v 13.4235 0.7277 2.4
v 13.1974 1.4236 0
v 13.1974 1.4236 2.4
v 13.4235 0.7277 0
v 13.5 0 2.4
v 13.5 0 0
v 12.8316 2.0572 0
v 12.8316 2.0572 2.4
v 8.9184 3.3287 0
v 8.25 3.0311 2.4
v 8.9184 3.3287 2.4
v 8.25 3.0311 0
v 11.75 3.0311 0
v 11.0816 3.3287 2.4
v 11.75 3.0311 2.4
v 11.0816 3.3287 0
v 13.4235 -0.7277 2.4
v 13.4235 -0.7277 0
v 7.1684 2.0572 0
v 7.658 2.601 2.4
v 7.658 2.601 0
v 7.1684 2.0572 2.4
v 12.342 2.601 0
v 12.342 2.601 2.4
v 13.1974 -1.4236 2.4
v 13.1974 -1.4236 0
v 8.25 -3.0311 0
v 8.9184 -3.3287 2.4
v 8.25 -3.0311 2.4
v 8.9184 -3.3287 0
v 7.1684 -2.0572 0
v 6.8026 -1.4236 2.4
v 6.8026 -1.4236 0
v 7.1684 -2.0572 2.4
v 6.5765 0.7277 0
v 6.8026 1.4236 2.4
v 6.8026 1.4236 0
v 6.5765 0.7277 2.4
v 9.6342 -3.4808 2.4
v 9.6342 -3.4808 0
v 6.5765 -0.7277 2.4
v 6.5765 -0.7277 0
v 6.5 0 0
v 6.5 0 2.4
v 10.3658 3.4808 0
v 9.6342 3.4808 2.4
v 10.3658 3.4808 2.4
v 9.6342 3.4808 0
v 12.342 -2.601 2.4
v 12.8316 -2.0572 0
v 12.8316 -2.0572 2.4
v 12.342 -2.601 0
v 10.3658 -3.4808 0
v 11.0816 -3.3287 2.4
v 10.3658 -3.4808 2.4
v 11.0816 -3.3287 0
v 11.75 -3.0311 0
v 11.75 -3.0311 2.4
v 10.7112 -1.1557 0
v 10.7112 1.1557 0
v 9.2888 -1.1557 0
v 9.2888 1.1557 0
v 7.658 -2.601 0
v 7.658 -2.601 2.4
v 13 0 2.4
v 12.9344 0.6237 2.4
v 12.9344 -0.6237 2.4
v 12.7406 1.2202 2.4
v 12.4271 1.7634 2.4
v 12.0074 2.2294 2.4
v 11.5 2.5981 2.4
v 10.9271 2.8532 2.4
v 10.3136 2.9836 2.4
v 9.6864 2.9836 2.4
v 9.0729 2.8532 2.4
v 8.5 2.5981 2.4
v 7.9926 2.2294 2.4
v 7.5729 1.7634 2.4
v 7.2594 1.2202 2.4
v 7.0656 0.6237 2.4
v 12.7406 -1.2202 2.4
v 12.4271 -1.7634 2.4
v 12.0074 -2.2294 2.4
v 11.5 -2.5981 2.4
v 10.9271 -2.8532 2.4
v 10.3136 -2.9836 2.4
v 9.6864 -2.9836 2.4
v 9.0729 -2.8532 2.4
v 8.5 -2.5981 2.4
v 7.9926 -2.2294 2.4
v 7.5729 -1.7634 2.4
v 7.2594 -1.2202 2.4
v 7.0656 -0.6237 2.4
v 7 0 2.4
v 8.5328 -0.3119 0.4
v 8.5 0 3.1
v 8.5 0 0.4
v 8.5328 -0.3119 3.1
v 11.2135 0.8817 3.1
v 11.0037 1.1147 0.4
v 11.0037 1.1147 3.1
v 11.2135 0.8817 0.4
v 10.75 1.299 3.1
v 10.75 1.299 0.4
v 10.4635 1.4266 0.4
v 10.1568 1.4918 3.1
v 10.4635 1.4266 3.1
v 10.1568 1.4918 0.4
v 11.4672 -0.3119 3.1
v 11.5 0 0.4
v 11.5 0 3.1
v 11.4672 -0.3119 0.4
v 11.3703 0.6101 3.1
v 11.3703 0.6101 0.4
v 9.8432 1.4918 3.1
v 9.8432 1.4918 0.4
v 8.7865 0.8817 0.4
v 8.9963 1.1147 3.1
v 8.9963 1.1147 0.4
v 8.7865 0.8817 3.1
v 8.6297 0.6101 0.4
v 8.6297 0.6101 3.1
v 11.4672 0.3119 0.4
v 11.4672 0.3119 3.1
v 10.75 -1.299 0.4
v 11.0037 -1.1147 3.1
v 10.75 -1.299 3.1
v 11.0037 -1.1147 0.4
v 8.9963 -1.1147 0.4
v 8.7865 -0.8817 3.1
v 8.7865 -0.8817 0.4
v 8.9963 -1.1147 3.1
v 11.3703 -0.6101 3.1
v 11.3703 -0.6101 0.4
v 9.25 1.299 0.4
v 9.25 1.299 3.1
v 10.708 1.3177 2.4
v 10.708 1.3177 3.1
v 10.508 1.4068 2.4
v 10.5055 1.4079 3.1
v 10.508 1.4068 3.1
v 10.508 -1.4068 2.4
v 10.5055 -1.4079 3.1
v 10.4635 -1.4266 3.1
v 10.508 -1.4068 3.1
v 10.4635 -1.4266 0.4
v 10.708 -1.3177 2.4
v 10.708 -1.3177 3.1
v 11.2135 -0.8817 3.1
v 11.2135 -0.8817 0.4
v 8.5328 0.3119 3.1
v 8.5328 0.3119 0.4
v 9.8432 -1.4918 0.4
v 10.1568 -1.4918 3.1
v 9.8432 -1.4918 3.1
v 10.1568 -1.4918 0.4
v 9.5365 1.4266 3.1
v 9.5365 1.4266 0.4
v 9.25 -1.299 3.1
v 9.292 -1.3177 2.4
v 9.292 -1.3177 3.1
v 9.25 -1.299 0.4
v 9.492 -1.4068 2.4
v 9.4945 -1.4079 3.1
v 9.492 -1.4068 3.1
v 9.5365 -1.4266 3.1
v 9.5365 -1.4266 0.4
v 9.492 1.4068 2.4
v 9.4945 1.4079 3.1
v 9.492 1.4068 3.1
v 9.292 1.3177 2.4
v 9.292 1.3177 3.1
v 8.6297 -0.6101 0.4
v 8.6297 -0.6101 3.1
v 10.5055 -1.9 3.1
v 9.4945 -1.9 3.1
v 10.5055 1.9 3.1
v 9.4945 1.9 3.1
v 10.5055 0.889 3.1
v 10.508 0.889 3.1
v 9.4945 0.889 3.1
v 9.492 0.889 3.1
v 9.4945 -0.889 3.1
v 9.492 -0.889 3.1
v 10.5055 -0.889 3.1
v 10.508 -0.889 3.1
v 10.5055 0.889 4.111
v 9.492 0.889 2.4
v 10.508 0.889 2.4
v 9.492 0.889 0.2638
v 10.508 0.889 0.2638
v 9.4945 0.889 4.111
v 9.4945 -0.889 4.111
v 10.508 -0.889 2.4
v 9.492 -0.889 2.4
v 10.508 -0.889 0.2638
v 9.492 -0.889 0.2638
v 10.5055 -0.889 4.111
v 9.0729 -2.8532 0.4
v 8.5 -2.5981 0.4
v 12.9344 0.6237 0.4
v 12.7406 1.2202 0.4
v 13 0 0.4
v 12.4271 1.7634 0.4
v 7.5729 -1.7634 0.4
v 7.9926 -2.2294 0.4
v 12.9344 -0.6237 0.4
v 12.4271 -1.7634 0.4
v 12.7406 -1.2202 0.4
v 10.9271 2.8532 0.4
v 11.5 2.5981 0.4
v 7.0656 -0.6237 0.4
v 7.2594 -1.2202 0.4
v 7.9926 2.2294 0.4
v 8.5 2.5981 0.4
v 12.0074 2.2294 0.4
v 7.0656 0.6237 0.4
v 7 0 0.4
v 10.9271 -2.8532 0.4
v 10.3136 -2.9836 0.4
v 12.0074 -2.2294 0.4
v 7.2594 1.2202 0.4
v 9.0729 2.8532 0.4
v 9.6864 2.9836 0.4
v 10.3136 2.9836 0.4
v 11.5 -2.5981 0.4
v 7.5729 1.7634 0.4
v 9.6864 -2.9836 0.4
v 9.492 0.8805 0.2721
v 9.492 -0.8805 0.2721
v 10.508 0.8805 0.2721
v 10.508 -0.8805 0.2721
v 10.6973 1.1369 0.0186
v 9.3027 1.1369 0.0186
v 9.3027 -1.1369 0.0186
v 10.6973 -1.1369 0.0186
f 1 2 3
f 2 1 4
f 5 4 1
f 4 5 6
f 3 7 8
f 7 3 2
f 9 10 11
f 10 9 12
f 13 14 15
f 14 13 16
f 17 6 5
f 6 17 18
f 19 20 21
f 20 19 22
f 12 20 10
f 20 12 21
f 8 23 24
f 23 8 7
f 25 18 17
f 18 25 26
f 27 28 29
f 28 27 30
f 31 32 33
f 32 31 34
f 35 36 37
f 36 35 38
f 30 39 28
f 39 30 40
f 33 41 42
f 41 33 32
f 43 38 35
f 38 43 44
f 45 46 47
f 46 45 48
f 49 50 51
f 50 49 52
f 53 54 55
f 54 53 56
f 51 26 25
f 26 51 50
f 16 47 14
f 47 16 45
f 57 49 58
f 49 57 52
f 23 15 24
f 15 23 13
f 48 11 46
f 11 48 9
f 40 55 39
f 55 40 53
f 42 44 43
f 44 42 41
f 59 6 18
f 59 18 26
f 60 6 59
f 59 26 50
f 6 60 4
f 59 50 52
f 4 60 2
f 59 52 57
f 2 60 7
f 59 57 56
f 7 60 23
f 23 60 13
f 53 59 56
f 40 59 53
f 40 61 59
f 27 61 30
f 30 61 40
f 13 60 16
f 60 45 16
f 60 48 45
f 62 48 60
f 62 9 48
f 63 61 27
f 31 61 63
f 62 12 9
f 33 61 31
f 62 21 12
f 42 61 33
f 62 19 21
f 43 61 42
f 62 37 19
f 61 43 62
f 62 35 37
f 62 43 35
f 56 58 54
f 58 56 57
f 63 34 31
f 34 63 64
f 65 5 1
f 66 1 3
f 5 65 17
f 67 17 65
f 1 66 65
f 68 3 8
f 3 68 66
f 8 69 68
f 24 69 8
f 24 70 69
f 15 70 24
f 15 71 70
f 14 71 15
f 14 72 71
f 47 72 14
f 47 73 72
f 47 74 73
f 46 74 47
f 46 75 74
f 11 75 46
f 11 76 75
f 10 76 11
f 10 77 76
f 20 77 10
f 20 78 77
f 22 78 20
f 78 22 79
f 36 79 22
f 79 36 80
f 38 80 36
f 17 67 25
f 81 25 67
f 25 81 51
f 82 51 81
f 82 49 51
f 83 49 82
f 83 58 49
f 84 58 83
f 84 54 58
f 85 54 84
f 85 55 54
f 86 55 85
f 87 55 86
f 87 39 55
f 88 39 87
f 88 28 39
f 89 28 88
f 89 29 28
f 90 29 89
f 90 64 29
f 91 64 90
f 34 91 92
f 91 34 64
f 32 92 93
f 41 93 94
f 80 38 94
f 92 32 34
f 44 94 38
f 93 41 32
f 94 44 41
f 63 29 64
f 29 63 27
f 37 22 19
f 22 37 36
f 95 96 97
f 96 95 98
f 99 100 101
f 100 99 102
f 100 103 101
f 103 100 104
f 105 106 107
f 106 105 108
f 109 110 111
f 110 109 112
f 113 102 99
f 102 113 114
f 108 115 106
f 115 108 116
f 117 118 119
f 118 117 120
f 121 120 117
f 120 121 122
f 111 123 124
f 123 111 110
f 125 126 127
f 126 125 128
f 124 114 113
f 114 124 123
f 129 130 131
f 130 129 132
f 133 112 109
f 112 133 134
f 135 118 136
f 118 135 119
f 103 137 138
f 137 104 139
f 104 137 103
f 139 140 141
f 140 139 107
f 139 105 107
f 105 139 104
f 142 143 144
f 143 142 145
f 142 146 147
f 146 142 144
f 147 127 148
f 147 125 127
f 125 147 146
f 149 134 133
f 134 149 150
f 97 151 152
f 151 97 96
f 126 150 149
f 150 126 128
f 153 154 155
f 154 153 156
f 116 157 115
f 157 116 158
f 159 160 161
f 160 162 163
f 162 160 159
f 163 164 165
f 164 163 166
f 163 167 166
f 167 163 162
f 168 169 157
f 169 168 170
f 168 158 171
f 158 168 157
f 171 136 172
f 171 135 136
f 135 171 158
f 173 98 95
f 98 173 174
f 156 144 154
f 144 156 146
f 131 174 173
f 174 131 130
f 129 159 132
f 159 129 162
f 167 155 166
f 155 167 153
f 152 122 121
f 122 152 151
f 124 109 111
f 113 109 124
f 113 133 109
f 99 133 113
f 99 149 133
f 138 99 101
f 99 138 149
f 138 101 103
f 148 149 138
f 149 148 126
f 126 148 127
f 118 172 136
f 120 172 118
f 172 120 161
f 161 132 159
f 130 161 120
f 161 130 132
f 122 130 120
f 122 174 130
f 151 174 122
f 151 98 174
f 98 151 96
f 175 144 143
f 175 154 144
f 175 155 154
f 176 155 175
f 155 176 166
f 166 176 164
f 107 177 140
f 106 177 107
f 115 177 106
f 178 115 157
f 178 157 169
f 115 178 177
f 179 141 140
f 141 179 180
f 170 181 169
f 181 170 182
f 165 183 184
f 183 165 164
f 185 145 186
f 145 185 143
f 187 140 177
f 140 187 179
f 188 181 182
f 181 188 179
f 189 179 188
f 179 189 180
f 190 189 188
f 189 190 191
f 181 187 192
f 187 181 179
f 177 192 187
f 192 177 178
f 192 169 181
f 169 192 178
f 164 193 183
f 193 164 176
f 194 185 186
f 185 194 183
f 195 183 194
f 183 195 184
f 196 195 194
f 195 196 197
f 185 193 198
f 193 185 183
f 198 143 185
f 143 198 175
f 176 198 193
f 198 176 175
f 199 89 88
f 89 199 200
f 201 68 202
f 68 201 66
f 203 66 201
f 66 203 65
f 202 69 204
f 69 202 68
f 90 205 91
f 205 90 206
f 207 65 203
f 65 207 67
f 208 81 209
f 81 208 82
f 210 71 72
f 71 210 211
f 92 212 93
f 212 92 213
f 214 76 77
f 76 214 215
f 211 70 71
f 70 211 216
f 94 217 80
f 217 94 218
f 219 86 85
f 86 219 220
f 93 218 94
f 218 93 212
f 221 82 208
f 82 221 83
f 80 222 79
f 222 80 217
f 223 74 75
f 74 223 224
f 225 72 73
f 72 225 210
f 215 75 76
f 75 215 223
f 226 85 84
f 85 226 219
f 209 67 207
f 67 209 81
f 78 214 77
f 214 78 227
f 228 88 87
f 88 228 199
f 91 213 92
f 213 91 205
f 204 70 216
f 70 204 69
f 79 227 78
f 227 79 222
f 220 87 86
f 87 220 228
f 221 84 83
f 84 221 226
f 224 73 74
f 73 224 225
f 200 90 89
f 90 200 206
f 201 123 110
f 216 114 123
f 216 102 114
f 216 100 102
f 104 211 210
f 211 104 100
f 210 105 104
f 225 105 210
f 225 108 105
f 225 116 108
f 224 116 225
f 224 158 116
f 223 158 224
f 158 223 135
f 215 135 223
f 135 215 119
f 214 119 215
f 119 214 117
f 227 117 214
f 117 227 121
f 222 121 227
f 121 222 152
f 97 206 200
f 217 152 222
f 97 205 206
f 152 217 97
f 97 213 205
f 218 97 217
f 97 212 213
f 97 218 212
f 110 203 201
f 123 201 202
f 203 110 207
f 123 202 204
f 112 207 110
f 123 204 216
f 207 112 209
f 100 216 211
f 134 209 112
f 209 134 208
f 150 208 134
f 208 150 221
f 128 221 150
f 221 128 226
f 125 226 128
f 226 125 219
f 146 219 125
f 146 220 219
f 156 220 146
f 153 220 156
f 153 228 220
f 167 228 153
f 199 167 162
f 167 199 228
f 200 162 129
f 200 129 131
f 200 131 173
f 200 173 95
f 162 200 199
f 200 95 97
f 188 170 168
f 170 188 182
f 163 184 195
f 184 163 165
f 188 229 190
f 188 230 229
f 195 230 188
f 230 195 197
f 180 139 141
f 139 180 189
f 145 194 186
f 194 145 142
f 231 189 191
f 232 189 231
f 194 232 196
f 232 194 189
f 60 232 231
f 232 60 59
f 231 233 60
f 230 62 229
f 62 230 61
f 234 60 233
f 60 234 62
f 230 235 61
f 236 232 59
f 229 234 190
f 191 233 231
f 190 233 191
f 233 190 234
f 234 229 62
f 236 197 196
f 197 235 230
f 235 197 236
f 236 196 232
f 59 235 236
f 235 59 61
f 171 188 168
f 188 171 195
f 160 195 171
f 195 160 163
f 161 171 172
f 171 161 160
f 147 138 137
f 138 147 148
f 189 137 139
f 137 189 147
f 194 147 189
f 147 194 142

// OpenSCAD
// Higher definition curves
$fs = 0.01;

module roundedcube(size = [1, 1, 1], center = false, radius = 1.0, apply_to = "all") {
	// If single value, convert to [x, y, z] vector
	size = (size[0] == undef) ? [size, size, size] : size;

	translate_min = radius;
	translate_xmax = size[0] - radius;
	translate_ymax = size[1] - radius;
	translate_zmax = size[2] - radius;

	diameter = radius * 2;

	module build_point(type = "sphere", rotate = [0, 0, 0]) {
		if (type == "sphere") {
			sphere(r = radius);
		} else if (type == "cylinder") {
			rotate(a = rotate)
			cylinder(h = size[2], r = 2*radius, center = true);
		} else if (type == "cube") {
            rotate(a = rotate)
            cube([diameter*2,diameter*2,size[2]], center=true);
        }
	}

	obj_translate = (center == false) ?
		[0, 0, 0] : [
			-(size[0] / 2),
			-(size[1] / 2),
			-(size[2] / 2)
		];

	translate(v = obj_translate) {
		hull() {
			for (translate_x = [translate_min,translate_xmax]) {
				x_at = (translate_x == translate_min) ? "min" : "max";
				for (translate_y = [translate_min, translate_ymax]) {
					y_at = (translate_y == translate_min) ? "min" : "max";
					for (translate_z = [size[2]/2]) {
						z_at = (translate_z == translate_min) ? "min" : "max";

						translate(v = [translate_x, translate_y, translate_z])
						if (
							(apply_to == "all") ||
							(apply_to == "xmin" && x_at == "min") || (apply_to == "xmax" && x_at == "max") ||
							(apply_to == "ymin" && y_at == "min") || (apply_to == "ymax" && y_at == "max") ||
							(apply_to == "zmin" && z_at == "min") || (apply_to == "zmax" && z_at == "max")
						) {
							build_point("sphere");
						} else {
							rotate = 
								(apply_to == "xmin" || apply_to == "xmax" || apply_to == "x") ? [0, 90, 0] : (
								(apply_to == "ymin" || apply_to == "ymax" || apply_to == "y") ? [90, 90, 0] :
								[0, 0, 0]
							);
                            if (y_at == "max") {
                                    build_point("cylinder", rotate);
                            } else {
                                    build_point("cube", rotate);
							}
						}
					}
				}
			}
            }
	}
}

pl = 9.5;
ph = 12.2;  // 1.0 = space for board
pw = 3.5;
pofs = 7.3; // offset of center point on ph
bofs = 0.8; // space for board
pho = ph - bofs;
rad = 1.0;

magwMountFloor = 0.4;
magwMountGap = 0.2;
magwGapTot = magwMountFloor + magwMountGap;

magw = 2.0;
magod = 6;
magid = 3;

clipfloor = 0.4;
clipfloor_dia = 1.4;

addabit = 0.01;

caseClipCutBase = pw/2;
caseClipCutWidth = 0.3;
caseClipLength = 3.0;
caseClipWidth = 0.75;
caseClipCenter = 0.8;
caseClipHeight = 0.5;

module nub() {
    translate([0,0,0.5]) cylinder(h = 1.0, d = 1.0, center=true);
}

module triangle2(width, height)  {
    rotate([0,-90,0])
    linear_extrude(height = height, center=true, convexity=10)
    polygon([[0,side],[height,0],[0,0]]);
}


// pot shell
/*
union () {
    difference() {
        translate([0,0,pw/2]) union() {
            
            //translate([-pl/2 + 1,-pho/2 + 0.5,pw/2]) nub();
            //translate([-pl/2 + 1,pho/2 - 2.0,pw/2]) nub();
            //translate([pl/2 - 1,pho/2 - 2.0,pw/2]) nub();
            translate([-3.88, 3.75, pw/2]) nub();
            translate([3.88, 3.75, pw/2]) nub();
            translate([-3.88, -4.43, pw/2]) nub();
            translate([0,pho/2 - pofs + bofs,0]) roundedcube(size=[pl - 2 * rad, pho - 2 * rad, pw], center=true, radius = rad, apply_to="z");
        }
        translate([0,0,pw - magw - magwGapTot + addabit]) cylinder(h = magw + magwGapTot, d = magod + 1.6);
        scale([1,1,2]) cylinder(h = (pw-magw - magwGapTot), d = magid + 0.2);
        cylinder(h=clipfloor, d = magid + clipfloor_dia);
        translate([0,-pho/2 - 0.5,0]) scale([1,1.1,1.1]) rotate([0,90,90]) cube([10,3,1.5],center=true);
        translate([-100,-caseClipCenter-caseClipLength/2-caseClipCutWidth, caseClipCutBase]) cube([200, caseClipCutWidth*2 + caseClipLength, 200]);
    }
    translate([pl/2 - caseClipWidth,-caseClipCenter-caseClipLength/2,0]) cube([caseClipWidth, caseClipLength,  pw + caseClipHeight]);
    translate([pl/2 - caseClipWidth,-caseClipCenter,pw+caseClipHeight]) rotate([0,0,-90]) triangle(1.2, 1.1, caseClipLength);
    
    
    translate([-pl/2,-caseClipCenter-caseClipLength/2,0]) cube([caseClipWidth, caseClipLength,  pw + caseClipHeight]);
    translate([-pl/2+caseClipWidth,-caseClipCenter,pw+caseClipHeight]) rotate([0,0,90]) triangle(1.2, 1.1, caseClipLength);
}*/

module magnet(height) {
    difference() {
        cylinder(h = height, d = magod);
        cylinder(h = height, d = magid);
    }
}
module triangle(side, height, width=0)  {
    realwidth = (width == 0) ? side : width;
    rotate([0,-90,0])
    linear_extrude(height = realwidth, center=true, convexity=10)
    polygon([[0,side],[height,0],[0,0]]);
}

// mount
pegWidth = 0.040*25.4;
pegHeight = 0.07*25.4;//0.085 was very hard to put on
pegLength = 0.045*25.4;

mount_h = magw + magwMountFloor;
mount_wall = 1.0;

clip_wall_gap = 0.2;
clip_wall_height = 0;
// translate([0,0,pw]) rotate([0,180,90])


translate([10,0,0])
  {
    difference () {
        union() {   
            cylinder(h = mount_h, d = magod+mount_wall);
            translate([0,0,0]) cylinder(h = pw - clipfloor, d = magid);
            side = (magid/2 - pegHeight/2 + clipfloor_dia/2) - 0.3;
            translate([0,pegHeight/2,pw-clipfloor]) triangle(side,side);
            translate([0,-pegHeight/2,pw-clipfloor]) rotate([180,180,0]) triangle(side,side);
        }
        linear_extrude(mount_h*3) {
            square([pegWidth, pegHeight], center=true);
        }
        linear_extrude(pegLength*.5, scale=[0.4, 0.5]) {
            square([pegWidth*1.4, pegHeight*1.3], center=true);
        }
        translate([0, 0, magwMountFloor]) magnet(magw);
        translate([-pegWidth/2-clip_wall_gap,-magid/2, mount_h - clip_wall_height]) cube([clip_wall_gap, magid, 200]);
        translate([pegWidth/2,-magid/2, mount_h - clip_wall_height]) cube([clip_wall_gap, magid, 200]);
    }
}
